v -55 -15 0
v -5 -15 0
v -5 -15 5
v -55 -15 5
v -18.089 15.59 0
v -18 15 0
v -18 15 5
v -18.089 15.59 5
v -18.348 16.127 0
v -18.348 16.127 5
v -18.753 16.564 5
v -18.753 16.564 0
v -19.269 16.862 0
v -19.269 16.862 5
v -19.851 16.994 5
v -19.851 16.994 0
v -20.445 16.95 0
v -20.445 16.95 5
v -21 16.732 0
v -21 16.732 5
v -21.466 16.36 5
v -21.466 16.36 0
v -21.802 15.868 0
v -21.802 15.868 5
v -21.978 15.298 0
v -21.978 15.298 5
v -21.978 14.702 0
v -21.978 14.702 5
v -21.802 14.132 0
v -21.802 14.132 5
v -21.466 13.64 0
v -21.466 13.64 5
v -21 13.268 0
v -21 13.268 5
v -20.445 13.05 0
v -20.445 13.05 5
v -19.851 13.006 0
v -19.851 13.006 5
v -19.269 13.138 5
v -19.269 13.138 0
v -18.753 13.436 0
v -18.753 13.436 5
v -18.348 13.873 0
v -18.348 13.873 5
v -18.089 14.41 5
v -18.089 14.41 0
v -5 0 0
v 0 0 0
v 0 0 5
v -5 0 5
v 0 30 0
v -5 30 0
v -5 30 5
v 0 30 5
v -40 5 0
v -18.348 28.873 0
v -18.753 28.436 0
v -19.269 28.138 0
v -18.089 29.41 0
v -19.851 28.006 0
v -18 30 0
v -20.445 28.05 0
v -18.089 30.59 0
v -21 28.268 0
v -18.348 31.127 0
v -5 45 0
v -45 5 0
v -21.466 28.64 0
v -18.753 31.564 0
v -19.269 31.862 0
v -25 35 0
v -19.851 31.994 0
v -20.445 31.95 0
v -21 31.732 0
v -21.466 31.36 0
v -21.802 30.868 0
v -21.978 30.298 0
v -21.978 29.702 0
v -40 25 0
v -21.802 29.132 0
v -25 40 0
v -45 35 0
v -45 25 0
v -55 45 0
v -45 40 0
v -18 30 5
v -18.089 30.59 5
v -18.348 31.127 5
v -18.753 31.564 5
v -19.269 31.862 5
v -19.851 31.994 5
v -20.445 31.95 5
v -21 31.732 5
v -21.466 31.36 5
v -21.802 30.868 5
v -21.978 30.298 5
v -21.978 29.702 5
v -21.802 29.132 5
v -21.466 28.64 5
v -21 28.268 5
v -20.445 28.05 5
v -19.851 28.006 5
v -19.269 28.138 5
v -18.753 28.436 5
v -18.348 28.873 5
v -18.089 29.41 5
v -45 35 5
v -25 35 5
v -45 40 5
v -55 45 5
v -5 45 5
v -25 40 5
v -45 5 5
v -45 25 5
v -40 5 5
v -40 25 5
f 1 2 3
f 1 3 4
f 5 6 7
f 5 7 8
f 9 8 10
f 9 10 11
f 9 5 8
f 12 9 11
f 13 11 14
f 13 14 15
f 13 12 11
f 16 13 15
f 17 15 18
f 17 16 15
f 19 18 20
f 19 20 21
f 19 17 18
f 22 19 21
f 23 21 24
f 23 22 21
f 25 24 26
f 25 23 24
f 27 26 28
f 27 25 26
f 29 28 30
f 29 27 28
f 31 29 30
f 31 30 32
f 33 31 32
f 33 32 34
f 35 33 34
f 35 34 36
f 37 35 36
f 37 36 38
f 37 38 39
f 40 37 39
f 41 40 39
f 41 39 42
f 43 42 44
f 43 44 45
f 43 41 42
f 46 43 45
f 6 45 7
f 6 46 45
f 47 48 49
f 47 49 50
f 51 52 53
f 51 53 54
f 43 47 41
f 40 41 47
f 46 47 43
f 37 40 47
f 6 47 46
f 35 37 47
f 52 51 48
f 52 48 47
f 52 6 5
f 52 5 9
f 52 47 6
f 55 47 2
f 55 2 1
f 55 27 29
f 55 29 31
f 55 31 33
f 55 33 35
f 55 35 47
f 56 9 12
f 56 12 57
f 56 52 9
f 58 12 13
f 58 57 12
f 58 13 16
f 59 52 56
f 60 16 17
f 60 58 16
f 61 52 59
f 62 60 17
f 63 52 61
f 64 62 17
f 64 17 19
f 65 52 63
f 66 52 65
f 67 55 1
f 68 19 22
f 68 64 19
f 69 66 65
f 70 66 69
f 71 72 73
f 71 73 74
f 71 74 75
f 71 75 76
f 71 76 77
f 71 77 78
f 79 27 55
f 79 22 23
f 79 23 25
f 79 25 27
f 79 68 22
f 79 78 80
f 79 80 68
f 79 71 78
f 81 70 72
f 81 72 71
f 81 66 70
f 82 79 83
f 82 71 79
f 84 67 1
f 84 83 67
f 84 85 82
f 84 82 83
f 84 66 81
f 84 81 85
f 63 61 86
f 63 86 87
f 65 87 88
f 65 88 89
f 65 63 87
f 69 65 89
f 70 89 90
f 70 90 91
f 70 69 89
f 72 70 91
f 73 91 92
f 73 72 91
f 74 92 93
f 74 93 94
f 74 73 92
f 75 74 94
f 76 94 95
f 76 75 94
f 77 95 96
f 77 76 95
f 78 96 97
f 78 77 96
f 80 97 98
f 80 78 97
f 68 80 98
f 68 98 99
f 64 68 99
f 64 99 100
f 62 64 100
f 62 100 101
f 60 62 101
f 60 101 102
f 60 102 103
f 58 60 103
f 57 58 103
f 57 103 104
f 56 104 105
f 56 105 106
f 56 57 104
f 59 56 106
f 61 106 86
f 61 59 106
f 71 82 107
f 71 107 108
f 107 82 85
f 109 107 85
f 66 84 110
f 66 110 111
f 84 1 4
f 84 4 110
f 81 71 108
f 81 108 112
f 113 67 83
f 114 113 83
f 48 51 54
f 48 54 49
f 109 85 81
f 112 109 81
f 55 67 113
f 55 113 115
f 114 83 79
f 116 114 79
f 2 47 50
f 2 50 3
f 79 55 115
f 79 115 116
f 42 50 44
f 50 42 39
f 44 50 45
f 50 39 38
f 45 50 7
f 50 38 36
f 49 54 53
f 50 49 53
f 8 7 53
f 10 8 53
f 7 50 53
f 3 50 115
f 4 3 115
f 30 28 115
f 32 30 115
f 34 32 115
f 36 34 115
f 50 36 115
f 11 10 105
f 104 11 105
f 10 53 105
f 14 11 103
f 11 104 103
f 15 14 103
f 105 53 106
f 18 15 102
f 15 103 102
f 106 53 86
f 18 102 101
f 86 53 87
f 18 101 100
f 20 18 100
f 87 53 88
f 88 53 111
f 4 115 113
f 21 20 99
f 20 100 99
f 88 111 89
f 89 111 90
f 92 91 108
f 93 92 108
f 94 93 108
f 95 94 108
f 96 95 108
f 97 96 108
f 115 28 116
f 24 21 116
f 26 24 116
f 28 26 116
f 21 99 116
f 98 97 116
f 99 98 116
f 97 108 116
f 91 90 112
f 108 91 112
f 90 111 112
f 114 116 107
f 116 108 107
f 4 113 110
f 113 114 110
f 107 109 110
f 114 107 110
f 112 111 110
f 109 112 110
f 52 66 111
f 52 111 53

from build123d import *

# Parameters (mm, degrees)
ESQUISSE1_R        = 2
ESQUISSE1_W        = 20
ESQUISSE1_H        = 5
ESQUISSE1_W_2      = 5
ESQUISSE1_H_2      = 20
BOSS_EXTRU_1_DEPTH = 5


with BuildPart() as part:
    # Esquisse1 → Boss.-Extru.1 (new body)
    with BuildSketch(Plane.XY):
        Polygon((-55, 45), (-5, 45), (-5, 30), (0, 30), (0, 0), (-5, 0), (-5, -15), (-55, -15), align=None)
        with Locations((-20, 30)):
            Circle(ESQUISSE1_R, mode=Mode.SUBTRACT)
        with Locations((-20, 15)):
            Circle(ESQUISSE1_R, mode=Mode.SUBTRACT)
        with Locations((-35, 37.5)):
            Rectangle(ESQUISSE1_W, ESQUISSE1_H, mode=Mode.SUBTRACT)
        with Locations((-42.5, 15)):
            Rectangle(ESQUISSE1_W_2, ESQUISSE1_H_2, mode=Mode.SUBTRACT)
    extrude(amount=BOSS_EXTRU_1_DEPTH)


solid = part.part
